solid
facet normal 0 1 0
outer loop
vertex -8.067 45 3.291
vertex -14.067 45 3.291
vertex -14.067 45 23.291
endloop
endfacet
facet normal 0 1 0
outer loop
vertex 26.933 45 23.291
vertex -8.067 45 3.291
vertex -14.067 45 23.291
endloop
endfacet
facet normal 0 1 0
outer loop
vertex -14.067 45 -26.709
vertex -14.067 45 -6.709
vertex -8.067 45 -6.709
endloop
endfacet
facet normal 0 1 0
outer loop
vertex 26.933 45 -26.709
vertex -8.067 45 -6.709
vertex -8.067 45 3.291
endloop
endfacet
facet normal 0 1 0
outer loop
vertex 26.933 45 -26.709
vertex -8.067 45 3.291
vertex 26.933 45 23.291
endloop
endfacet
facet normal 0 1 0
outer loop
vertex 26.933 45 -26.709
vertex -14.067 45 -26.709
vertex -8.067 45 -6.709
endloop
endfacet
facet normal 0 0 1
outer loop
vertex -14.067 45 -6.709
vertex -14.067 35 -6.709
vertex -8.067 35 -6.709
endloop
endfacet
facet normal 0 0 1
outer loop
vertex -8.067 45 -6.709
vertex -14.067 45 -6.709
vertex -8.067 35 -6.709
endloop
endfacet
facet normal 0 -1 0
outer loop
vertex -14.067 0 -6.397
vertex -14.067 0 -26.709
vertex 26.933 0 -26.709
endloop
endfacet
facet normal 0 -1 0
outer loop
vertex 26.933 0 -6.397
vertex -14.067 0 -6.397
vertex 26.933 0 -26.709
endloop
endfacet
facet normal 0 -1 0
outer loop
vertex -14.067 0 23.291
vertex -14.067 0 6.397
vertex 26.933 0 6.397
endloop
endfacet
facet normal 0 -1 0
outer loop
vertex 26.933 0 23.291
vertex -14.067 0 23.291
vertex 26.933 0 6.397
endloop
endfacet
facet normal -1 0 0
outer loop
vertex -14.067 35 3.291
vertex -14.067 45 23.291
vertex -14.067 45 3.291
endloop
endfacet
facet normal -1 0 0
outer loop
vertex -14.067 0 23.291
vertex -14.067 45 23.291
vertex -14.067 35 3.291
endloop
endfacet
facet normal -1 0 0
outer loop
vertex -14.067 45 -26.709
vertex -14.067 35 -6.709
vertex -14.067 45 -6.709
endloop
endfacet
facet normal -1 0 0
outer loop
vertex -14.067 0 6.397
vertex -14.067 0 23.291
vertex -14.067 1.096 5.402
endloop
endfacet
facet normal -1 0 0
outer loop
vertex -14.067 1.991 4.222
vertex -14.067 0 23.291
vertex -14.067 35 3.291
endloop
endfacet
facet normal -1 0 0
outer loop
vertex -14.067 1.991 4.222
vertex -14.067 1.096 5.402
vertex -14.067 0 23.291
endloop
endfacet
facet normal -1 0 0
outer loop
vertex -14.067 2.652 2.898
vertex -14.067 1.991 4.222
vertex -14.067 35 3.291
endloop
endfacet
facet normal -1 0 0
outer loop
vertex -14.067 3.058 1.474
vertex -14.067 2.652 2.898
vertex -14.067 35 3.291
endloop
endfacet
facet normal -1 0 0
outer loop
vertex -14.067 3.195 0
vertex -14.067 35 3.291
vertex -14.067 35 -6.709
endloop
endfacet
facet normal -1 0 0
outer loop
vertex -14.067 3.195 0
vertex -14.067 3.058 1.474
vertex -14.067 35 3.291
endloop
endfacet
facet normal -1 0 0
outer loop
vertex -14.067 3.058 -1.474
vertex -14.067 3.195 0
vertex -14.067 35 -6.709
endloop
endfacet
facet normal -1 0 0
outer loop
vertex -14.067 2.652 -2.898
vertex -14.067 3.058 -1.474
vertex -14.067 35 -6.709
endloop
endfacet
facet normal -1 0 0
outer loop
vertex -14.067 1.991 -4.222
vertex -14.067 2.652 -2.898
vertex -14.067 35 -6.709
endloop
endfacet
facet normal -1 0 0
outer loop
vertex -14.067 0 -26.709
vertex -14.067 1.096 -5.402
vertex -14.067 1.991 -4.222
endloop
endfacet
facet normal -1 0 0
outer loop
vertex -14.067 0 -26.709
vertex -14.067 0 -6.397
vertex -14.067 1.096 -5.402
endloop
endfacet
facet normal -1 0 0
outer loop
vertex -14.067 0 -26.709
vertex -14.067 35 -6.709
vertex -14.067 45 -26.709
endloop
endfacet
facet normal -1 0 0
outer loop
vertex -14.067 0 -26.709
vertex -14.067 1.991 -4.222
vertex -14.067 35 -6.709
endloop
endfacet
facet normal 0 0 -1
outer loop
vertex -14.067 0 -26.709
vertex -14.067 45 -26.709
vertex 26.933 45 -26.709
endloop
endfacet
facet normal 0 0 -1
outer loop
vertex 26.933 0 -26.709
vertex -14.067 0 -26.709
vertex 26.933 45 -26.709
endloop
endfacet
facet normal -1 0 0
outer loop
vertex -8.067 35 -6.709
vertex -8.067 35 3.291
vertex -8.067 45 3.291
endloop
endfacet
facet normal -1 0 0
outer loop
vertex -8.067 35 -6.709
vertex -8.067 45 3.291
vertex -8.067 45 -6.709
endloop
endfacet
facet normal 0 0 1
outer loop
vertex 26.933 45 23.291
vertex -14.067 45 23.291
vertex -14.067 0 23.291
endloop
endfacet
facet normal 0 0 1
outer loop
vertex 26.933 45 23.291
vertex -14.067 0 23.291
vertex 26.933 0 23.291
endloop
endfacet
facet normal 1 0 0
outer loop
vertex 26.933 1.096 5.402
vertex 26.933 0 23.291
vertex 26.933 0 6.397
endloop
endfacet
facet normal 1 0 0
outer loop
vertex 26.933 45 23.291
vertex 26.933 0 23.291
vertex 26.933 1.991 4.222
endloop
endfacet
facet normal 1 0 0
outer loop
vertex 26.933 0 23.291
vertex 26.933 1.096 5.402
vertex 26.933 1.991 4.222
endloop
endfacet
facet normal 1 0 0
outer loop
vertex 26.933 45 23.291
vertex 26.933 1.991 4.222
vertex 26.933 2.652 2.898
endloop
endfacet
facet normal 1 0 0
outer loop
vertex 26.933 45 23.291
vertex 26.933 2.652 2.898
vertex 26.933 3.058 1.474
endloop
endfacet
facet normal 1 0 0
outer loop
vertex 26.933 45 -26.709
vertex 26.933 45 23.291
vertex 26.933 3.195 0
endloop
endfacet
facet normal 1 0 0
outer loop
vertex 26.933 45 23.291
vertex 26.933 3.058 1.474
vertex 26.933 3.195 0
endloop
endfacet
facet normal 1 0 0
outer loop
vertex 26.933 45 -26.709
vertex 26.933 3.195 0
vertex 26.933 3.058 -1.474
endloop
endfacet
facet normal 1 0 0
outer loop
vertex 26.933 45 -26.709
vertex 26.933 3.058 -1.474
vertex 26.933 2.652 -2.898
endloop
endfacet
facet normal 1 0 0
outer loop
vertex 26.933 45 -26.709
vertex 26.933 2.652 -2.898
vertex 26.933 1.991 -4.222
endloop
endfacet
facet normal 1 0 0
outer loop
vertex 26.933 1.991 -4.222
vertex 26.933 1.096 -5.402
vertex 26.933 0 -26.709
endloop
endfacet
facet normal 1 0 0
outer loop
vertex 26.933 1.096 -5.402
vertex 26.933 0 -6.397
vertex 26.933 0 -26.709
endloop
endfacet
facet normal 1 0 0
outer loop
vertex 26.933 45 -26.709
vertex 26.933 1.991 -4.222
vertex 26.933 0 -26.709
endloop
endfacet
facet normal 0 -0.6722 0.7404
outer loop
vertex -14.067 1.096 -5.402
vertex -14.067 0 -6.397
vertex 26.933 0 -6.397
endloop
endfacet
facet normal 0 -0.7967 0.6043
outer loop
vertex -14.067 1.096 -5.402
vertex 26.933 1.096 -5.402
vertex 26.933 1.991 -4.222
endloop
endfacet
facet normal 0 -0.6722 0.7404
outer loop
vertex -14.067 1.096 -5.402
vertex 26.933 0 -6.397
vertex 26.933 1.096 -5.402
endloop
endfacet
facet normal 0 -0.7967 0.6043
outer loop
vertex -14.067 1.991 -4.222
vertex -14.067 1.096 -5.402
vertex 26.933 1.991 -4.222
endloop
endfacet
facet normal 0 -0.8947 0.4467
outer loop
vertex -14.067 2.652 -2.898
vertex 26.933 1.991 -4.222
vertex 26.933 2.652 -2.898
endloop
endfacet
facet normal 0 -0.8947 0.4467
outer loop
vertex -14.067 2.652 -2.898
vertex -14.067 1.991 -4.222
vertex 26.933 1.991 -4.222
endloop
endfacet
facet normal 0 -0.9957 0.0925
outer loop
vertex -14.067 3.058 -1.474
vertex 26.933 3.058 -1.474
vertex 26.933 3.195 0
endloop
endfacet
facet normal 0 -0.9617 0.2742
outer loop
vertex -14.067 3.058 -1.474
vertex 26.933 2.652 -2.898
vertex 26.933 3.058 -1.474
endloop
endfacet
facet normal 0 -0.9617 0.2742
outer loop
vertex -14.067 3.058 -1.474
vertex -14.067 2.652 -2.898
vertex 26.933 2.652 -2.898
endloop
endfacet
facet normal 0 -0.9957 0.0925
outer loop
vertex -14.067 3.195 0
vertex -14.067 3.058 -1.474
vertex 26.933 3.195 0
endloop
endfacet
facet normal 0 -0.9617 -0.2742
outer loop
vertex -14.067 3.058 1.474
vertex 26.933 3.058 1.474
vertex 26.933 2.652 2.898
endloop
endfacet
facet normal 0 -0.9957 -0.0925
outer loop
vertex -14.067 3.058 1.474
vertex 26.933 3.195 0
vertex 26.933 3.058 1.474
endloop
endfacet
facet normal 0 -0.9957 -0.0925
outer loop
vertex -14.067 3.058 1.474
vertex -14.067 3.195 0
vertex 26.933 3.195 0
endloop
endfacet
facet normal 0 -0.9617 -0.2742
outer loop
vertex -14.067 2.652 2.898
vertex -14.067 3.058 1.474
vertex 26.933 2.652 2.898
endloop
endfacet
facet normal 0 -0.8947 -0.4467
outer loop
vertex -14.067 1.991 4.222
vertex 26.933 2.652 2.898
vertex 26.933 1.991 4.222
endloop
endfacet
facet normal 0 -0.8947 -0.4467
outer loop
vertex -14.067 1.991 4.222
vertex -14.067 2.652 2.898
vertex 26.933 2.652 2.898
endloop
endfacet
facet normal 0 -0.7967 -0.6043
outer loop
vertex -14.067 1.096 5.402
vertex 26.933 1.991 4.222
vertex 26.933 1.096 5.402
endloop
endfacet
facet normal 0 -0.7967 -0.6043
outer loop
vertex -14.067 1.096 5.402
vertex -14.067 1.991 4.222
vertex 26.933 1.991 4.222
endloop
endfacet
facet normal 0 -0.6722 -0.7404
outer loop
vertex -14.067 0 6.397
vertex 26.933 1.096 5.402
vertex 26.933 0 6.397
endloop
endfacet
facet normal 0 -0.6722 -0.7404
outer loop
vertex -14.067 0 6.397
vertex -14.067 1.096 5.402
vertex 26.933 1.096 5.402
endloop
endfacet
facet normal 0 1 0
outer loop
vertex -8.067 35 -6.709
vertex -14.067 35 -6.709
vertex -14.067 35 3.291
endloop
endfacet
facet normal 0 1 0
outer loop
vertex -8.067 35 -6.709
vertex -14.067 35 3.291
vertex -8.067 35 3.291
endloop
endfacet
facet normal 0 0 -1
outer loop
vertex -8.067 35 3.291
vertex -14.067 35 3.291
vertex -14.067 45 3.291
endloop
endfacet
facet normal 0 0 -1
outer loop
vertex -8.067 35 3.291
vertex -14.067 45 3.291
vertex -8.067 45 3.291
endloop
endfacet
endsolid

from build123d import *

# Parameters (mm, degrees)
SKETCH1_W               = 41
SKETCH1_H               = 50
BOSS_EXTRUDE1_DEPTH     = 45
CUT_EXTRUDE1_DEPTH      = 59.85373316
CUT_EXTRUDE1_DEPTH_BACK = 10
SKETCH2_W               = 12
SKETCH2_H               = 10
CUT_EXTRUDE2_DEPTH      = 67.47818445
CUT_EXTRUDE2_DEPTH_BACK = 67.47818445
SKETCH3_R               = 8


with BuildPart() as part:
    # Sketch1 → Boss-Extrude1 (new body)
    with BuildSketch(Plane(origin=(0, 0, 0), x_dir=(1, 0, 0), z_dir=(0, 1, 0))):
        with Locations((6.433490288, 1.708594269)):
            Rectangle(SKETCH1_W, SKETCH1_H)
    extrude(amount=BOSS_EXTRUDE1_DEPTH)

    # Sketch2 → Cut-Extrude1 (cut, two sides: drawn at the far end of the back side and taken through both)
    with BuildSketch(Plane(origin=(0, 45, 0), x_dir=(1, 0, 0), z_dir=(0, 1, 0)).offset(-CUT_EXTRUDE1_DEPTH_BACK)):
        with Locations((-14.066509712, 1.708594269)):
            Rectangle(SKETCH2_W, SKETCH2_H)
    extrude(amount=CUT_EXTRUDE1_DEPTH + CUT_EXTRUDE1_DEPTH_BACK, mode=Mode.SUBTRACT)

    # Sketch3 → Cut-Extrude2 (cut, two sides: drawn at the far end of the back side and taken through both)
    with BuildSketch(Plane(origin=(26.933490288, 0, 0), x_dir=(0, 0, -1), z_dir=(1, 0, 0)).offset(-CUT_EXTRUDE2_DEPTH_BACK)):
        with Locations((0, -4.804588256)):
            Circle(SKETCH3_R)
    extrude(amount=CUT_EXTRUDE2_DEPTH + CUT_EXTRUDE2_DEPTH_BACK, mode=Mode.SUBTRACT)


solid = part.part
